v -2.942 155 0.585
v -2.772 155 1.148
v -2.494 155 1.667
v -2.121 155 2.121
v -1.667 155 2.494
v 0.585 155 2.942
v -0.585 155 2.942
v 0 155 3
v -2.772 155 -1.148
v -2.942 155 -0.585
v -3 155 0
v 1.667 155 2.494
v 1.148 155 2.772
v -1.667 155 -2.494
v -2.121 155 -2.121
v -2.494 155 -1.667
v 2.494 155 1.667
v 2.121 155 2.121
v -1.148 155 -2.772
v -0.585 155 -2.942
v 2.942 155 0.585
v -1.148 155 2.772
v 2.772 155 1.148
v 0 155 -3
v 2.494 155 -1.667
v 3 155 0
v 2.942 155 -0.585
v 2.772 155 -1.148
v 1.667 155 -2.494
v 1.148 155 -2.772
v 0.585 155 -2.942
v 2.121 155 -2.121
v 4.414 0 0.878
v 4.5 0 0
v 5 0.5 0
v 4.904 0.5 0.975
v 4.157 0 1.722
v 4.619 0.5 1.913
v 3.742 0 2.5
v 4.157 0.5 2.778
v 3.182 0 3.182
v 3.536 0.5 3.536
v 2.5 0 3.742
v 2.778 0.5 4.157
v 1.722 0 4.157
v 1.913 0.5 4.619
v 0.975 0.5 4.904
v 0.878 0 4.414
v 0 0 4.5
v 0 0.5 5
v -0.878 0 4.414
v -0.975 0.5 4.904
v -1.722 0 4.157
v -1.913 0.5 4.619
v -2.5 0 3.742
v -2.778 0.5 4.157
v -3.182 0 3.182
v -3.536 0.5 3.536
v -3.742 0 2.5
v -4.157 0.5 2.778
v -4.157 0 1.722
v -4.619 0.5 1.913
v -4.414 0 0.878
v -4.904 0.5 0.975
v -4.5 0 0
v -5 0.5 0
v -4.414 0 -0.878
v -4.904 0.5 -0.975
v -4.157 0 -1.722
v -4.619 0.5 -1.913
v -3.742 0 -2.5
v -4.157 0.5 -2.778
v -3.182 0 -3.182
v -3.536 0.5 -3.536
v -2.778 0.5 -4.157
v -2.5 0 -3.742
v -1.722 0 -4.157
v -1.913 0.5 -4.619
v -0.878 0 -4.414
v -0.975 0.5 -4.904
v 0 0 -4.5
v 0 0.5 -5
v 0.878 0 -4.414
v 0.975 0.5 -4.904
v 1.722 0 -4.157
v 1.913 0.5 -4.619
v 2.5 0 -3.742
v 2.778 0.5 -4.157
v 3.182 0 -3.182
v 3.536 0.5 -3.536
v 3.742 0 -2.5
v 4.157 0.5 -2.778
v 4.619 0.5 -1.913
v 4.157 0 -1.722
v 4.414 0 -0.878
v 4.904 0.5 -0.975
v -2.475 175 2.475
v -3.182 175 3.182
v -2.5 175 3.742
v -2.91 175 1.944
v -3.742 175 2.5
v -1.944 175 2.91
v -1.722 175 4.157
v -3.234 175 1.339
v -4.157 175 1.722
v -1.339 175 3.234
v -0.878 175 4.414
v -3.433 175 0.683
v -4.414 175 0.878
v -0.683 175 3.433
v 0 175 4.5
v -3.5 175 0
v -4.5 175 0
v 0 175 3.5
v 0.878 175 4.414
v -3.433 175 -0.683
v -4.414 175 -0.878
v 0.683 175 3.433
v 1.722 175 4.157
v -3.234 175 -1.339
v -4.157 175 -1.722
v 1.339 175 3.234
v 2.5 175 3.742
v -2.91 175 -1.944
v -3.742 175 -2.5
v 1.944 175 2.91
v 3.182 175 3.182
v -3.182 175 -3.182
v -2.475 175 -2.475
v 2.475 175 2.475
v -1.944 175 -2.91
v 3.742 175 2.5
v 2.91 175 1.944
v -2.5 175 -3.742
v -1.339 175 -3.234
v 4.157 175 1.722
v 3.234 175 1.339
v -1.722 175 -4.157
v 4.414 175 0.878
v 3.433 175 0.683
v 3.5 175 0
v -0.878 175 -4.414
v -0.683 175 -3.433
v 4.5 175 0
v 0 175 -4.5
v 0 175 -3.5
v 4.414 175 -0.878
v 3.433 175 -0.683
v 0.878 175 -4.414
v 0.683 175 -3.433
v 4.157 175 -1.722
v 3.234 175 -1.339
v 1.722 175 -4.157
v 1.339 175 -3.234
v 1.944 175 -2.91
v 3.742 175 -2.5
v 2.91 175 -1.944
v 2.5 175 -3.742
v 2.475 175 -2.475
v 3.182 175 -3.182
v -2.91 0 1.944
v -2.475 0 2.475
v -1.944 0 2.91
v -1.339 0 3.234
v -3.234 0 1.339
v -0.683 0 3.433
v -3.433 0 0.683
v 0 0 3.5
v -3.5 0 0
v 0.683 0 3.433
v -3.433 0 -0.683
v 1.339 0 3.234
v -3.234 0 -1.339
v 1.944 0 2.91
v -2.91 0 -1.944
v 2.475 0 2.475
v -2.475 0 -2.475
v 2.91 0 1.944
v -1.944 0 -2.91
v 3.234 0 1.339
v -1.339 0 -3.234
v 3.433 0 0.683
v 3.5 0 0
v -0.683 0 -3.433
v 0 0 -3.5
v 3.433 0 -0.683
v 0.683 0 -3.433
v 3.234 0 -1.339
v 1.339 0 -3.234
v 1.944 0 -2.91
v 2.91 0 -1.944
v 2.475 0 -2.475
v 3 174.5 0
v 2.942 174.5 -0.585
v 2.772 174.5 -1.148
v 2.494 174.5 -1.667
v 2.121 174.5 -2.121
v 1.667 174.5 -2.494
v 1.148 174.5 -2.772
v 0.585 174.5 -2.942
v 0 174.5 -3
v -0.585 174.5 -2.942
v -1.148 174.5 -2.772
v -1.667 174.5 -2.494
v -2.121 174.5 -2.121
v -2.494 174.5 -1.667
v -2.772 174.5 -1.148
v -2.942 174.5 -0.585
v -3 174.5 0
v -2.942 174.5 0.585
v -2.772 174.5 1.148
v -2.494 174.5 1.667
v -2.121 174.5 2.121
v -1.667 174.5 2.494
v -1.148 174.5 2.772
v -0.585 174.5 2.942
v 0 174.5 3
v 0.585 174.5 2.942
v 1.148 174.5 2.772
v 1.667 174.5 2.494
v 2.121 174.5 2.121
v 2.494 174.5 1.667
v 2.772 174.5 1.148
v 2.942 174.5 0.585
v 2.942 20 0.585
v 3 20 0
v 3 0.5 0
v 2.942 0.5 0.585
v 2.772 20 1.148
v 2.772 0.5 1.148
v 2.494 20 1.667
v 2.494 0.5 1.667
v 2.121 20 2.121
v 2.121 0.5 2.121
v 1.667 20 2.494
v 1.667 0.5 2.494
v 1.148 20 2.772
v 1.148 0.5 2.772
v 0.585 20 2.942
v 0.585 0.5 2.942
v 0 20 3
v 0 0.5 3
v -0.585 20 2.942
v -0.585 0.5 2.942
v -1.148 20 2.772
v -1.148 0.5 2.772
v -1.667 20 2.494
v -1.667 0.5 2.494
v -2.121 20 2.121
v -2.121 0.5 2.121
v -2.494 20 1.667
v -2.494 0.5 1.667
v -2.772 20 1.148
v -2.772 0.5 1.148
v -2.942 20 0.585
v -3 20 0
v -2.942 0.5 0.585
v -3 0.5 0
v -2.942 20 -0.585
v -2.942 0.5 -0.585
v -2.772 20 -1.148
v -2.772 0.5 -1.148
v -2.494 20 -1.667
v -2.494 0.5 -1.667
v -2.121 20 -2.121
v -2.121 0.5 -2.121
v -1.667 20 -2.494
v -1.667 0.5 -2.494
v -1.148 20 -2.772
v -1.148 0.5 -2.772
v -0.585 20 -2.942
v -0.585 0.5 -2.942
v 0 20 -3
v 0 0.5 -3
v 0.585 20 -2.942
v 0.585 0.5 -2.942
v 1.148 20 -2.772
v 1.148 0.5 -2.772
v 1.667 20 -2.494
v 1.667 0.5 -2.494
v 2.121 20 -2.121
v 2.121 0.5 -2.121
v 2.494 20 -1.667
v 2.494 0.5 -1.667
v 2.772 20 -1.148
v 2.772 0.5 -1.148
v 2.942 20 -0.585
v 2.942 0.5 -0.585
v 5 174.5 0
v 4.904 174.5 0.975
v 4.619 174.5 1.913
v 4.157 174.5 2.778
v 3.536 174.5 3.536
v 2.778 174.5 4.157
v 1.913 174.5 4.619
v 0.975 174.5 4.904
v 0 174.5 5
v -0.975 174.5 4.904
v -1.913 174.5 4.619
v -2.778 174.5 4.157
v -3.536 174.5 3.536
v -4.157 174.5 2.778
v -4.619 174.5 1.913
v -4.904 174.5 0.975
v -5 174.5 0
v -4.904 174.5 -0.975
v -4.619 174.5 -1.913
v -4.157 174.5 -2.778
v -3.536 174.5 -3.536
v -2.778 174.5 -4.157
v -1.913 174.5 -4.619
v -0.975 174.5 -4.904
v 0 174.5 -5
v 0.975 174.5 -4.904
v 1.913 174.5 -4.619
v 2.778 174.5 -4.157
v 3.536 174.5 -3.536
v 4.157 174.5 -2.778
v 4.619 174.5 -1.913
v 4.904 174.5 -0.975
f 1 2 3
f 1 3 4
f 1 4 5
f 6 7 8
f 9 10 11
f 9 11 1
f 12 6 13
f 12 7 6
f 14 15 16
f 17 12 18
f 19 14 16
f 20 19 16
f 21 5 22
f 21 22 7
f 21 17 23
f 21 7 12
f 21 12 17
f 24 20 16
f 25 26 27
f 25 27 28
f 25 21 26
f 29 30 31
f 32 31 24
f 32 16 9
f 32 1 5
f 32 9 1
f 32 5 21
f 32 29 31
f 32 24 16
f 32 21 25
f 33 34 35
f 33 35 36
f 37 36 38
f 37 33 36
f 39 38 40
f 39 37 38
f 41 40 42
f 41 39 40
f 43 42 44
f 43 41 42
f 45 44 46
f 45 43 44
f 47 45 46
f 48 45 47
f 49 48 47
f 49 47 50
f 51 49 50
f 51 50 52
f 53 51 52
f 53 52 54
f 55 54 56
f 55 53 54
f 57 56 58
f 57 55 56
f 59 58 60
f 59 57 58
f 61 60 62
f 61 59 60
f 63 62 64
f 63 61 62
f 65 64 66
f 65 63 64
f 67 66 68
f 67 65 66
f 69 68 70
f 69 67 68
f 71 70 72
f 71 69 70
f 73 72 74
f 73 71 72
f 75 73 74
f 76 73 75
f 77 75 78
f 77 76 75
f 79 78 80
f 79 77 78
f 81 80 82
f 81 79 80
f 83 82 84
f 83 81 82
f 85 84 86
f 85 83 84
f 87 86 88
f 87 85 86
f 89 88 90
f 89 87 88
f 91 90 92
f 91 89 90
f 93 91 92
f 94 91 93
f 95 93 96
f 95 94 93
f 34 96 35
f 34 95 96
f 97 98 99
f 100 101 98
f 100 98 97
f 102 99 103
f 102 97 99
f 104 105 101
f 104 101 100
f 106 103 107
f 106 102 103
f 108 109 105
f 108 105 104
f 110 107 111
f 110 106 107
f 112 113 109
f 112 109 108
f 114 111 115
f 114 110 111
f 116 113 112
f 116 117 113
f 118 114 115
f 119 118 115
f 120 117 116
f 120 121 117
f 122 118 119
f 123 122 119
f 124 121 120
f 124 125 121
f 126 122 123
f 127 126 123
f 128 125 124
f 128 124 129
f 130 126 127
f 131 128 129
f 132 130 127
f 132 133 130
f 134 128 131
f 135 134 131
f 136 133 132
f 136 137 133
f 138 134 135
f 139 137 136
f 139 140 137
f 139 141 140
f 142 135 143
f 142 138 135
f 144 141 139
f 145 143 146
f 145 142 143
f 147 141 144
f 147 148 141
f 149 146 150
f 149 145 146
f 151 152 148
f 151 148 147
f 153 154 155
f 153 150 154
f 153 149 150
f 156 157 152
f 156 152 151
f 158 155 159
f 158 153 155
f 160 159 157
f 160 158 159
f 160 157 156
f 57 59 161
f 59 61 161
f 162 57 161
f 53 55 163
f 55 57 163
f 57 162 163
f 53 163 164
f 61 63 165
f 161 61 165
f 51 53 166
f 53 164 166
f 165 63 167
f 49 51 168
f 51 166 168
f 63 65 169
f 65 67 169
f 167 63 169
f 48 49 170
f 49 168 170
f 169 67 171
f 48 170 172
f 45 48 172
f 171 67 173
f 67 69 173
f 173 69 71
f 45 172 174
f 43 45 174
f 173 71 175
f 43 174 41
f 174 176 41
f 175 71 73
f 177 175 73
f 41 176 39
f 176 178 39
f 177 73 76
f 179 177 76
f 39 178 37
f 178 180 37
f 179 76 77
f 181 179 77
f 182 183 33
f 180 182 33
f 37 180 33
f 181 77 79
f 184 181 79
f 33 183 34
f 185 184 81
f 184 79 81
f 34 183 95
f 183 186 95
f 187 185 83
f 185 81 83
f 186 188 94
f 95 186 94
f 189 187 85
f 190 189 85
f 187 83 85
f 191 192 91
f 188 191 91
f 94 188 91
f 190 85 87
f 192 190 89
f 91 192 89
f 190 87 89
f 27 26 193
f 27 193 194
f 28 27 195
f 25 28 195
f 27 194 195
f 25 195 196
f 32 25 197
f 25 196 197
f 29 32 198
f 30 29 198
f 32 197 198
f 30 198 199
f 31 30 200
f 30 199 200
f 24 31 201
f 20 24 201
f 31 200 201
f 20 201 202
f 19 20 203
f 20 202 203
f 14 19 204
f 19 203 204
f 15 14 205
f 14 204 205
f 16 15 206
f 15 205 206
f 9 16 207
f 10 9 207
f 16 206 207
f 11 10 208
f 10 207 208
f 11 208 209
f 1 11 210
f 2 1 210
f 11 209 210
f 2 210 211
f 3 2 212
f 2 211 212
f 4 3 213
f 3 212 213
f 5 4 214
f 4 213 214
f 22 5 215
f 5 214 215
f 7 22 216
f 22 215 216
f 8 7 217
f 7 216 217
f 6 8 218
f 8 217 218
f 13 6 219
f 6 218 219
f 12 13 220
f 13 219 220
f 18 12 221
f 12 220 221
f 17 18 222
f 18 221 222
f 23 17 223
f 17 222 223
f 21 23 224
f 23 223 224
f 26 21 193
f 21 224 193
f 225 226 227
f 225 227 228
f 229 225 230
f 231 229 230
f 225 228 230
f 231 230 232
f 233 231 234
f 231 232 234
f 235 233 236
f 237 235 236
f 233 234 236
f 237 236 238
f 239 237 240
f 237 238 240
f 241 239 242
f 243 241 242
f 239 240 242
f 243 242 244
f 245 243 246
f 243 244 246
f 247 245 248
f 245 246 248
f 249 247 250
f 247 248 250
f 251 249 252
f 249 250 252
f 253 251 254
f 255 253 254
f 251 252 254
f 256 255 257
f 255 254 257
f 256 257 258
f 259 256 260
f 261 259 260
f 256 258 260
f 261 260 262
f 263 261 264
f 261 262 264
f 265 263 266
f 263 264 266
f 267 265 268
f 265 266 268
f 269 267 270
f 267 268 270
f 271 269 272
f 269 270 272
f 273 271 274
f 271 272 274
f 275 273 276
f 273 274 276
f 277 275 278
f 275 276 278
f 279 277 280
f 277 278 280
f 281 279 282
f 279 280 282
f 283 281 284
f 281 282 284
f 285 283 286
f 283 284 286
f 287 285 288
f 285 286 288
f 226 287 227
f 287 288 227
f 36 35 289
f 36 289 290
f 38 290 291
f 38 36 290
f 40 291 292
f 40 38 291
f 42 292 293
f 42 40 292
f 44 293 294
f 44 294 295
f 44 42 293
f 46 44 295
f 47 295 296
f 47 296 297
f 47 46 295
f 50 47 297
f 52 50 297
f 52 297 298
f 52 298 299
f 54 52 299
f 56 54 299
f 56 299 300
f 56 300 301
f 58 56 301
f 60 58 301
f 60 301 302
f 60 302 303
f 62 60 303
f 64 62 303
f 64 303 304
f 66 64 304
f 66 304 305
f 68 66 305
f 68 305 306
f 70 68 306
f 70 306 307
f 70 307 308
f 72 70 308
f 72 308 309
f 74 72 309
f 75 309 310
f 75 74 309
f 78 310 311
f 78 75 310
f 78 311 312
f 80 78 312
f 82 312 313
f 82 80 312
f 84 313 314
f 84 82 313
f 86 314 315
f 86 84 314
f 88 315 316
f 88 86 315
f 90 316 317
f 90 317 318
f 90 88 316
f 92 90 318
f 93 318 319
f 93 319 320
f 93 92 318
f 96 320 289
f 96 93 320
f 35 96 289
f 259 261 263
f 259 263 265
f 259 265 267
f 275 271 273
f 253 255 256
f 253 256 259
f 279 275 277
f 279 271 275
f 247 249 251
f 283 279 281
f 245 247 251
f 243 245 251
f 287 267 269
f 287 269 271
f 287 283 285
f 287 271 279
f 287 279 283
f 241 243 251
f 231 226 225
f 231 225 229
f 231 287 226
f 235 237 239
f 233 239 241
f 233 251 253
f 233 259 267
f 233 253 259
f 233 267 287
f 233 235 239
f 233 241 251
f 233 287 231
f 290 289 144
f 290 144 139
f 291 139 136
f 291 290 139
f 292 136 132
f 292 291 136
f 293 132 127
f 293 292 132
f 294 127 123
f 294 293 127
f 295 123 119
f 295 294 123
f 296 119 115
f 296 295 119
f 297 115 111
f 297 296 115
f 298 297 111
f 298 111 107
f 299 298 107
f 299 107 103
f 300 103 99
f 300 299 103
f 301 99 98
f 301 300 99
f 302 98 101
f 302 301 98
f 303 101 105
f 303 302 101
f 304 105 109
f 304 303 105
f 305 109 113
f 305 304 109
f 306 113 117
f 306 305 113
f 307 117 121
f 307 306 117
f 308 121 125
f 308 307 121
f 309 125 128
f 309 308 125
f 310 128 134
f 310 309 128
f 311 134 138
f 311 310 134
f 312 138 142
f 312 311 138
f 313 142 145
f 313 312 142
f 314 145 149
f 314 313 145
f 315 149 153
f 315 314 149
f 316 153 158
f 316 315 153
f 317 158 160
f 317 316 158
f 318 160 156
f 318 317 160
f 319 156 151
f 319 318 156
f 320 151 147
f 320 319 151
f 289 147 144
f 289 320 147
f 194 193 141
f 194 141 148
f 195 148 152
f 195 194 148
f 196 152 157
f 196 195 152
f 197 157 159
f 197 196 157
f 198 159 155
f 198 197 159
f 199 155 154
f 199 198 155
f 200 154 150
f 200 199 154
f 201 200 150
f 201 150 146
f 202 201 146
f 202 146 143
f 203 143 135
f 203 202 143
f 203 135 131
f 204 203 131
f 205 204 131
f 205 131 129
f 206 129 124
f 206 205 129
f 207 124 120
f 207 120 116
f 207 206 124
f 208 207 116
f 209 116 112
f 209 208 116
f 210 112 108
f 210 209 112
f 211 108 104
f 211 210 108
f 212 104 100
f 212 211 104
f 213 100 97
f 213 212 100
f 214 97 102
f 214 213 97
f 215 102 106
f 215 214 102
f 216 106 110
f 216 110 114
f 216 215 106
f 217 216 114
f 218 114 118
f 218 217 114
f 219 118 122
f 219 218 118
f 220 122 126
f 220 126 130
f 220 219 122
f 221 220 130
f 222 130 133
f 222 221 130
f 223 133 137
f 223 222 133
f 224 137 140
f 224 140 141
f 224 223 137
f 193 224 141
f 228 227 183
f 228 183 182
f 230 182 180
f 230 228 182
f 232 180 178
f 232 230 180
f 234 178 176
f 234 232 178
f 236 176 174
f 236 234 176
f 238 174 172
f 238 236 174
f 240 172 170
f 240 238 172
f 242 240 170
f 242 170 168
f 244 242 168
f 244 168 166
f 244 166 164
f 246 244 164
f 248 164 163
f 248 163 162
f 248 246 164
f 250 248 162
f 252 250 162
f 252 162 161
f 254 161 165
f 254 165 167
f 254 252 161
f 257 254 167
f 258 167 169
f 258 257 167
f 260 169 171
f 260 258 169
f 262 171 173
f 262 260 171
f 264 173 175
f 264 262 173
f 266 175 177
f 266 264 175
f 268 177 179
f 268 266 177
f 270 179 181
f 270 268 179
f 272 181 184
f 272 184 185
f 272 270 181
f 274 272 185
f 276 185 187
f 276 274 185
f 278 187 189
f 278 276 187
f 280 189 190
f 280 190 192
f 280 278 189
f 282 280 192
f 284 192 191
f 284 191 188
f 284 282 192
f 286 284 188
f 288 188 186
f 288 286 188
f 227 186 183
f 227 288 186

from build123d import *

# Parameters (mm, degrees)
SKETCH1_R           = 10
BOSS_EXTRUDE1_DEPTH = 175
CHAMFER2_SIZE       = 0.5
SKETCH2_R           = 3
CUT_EXTRUDE1_DEPTH  = 20
CHAMFER3_SIZE       = 0.5
SKETCH3_R           = 3
CUT_EXTRUDE2_DEPTH  = 20
SKETCH4_R           = 10
SKETCH4_R_2         = 5
CUT_EXTRUDE3_DEPTH  = 273
CHAMFER5_SIZE       = 0.5


with BuildPart() as part:
    # Sketch1 → Boss-Extrude1 (new body)
    with BuildSketch(Plane(origin=(0, 0, 0), x_dir=(1, 0, 0), z_dir=(0, 1, 0))):
        Circle(SKETCH1_R)
    extrude(amount=BOSS_EXTRUDE1_DEPTH)

    # Chamfer2
    chamfer2_edges = [part.edges().sort_by_distance(p)[0] for p in [
        (-10, 0, 0),
        (-10, 175, 0),
    ]]
    chamfer(chamfer2_edges, length=CHAMFER2_SIZE)

    # Sketch2 → Cut-Extrude1 (cut)
    with BuildSketch(Plane(origin=(0, 175, 0), x_dir=(1, 0, 0), z_dir=(0, 1, 0))):
        Circle(SKETCH2_R)
    extrude(amount=-CUT_EXTRUDE1_DEPTH, mode=Mode.SUBTRACT)

    # Chamfer3
    chamfer3_edges = [part.edges().sort_by_distance(p)[0] for p in [
        (-3, 175, 0),
    ]]
    chamfer(chamfer3_edges, length=CHAMFER3_SIZE)

    # Sketch3 → Cut-Extrude2 (cut)
    with BuildSketch(Plane.XZ):
        Circle(SKETCH3_R)
    extrude(amount=-CUT_EXTRUDE2_DEPTH, mode=Mode.SUBTRACT)

    # Sketch4 → Cut-Extrude3 (cut)
    with BuildSketch(Plane.XZ):
        Circle(SKETCH4_R)
        Circle(SKETCH4_R_2, mode=Mode.SUBTRACT)
    extrude(amount=-CUT_EXTRUDE3_DEPTH, mode=Mode.SUBTRACT)

    # Chamfer5
    chamfer5_edges = [part.edges().sort_by_distance(p)[0] for p in [
        (-3, 0, 0),
        (-5, 175, 0),
        (-5, 0, 0),
    ]]
    chamfer(chamfer5_edges, length=CHAMFER5_SIZE)


solid = part.part
